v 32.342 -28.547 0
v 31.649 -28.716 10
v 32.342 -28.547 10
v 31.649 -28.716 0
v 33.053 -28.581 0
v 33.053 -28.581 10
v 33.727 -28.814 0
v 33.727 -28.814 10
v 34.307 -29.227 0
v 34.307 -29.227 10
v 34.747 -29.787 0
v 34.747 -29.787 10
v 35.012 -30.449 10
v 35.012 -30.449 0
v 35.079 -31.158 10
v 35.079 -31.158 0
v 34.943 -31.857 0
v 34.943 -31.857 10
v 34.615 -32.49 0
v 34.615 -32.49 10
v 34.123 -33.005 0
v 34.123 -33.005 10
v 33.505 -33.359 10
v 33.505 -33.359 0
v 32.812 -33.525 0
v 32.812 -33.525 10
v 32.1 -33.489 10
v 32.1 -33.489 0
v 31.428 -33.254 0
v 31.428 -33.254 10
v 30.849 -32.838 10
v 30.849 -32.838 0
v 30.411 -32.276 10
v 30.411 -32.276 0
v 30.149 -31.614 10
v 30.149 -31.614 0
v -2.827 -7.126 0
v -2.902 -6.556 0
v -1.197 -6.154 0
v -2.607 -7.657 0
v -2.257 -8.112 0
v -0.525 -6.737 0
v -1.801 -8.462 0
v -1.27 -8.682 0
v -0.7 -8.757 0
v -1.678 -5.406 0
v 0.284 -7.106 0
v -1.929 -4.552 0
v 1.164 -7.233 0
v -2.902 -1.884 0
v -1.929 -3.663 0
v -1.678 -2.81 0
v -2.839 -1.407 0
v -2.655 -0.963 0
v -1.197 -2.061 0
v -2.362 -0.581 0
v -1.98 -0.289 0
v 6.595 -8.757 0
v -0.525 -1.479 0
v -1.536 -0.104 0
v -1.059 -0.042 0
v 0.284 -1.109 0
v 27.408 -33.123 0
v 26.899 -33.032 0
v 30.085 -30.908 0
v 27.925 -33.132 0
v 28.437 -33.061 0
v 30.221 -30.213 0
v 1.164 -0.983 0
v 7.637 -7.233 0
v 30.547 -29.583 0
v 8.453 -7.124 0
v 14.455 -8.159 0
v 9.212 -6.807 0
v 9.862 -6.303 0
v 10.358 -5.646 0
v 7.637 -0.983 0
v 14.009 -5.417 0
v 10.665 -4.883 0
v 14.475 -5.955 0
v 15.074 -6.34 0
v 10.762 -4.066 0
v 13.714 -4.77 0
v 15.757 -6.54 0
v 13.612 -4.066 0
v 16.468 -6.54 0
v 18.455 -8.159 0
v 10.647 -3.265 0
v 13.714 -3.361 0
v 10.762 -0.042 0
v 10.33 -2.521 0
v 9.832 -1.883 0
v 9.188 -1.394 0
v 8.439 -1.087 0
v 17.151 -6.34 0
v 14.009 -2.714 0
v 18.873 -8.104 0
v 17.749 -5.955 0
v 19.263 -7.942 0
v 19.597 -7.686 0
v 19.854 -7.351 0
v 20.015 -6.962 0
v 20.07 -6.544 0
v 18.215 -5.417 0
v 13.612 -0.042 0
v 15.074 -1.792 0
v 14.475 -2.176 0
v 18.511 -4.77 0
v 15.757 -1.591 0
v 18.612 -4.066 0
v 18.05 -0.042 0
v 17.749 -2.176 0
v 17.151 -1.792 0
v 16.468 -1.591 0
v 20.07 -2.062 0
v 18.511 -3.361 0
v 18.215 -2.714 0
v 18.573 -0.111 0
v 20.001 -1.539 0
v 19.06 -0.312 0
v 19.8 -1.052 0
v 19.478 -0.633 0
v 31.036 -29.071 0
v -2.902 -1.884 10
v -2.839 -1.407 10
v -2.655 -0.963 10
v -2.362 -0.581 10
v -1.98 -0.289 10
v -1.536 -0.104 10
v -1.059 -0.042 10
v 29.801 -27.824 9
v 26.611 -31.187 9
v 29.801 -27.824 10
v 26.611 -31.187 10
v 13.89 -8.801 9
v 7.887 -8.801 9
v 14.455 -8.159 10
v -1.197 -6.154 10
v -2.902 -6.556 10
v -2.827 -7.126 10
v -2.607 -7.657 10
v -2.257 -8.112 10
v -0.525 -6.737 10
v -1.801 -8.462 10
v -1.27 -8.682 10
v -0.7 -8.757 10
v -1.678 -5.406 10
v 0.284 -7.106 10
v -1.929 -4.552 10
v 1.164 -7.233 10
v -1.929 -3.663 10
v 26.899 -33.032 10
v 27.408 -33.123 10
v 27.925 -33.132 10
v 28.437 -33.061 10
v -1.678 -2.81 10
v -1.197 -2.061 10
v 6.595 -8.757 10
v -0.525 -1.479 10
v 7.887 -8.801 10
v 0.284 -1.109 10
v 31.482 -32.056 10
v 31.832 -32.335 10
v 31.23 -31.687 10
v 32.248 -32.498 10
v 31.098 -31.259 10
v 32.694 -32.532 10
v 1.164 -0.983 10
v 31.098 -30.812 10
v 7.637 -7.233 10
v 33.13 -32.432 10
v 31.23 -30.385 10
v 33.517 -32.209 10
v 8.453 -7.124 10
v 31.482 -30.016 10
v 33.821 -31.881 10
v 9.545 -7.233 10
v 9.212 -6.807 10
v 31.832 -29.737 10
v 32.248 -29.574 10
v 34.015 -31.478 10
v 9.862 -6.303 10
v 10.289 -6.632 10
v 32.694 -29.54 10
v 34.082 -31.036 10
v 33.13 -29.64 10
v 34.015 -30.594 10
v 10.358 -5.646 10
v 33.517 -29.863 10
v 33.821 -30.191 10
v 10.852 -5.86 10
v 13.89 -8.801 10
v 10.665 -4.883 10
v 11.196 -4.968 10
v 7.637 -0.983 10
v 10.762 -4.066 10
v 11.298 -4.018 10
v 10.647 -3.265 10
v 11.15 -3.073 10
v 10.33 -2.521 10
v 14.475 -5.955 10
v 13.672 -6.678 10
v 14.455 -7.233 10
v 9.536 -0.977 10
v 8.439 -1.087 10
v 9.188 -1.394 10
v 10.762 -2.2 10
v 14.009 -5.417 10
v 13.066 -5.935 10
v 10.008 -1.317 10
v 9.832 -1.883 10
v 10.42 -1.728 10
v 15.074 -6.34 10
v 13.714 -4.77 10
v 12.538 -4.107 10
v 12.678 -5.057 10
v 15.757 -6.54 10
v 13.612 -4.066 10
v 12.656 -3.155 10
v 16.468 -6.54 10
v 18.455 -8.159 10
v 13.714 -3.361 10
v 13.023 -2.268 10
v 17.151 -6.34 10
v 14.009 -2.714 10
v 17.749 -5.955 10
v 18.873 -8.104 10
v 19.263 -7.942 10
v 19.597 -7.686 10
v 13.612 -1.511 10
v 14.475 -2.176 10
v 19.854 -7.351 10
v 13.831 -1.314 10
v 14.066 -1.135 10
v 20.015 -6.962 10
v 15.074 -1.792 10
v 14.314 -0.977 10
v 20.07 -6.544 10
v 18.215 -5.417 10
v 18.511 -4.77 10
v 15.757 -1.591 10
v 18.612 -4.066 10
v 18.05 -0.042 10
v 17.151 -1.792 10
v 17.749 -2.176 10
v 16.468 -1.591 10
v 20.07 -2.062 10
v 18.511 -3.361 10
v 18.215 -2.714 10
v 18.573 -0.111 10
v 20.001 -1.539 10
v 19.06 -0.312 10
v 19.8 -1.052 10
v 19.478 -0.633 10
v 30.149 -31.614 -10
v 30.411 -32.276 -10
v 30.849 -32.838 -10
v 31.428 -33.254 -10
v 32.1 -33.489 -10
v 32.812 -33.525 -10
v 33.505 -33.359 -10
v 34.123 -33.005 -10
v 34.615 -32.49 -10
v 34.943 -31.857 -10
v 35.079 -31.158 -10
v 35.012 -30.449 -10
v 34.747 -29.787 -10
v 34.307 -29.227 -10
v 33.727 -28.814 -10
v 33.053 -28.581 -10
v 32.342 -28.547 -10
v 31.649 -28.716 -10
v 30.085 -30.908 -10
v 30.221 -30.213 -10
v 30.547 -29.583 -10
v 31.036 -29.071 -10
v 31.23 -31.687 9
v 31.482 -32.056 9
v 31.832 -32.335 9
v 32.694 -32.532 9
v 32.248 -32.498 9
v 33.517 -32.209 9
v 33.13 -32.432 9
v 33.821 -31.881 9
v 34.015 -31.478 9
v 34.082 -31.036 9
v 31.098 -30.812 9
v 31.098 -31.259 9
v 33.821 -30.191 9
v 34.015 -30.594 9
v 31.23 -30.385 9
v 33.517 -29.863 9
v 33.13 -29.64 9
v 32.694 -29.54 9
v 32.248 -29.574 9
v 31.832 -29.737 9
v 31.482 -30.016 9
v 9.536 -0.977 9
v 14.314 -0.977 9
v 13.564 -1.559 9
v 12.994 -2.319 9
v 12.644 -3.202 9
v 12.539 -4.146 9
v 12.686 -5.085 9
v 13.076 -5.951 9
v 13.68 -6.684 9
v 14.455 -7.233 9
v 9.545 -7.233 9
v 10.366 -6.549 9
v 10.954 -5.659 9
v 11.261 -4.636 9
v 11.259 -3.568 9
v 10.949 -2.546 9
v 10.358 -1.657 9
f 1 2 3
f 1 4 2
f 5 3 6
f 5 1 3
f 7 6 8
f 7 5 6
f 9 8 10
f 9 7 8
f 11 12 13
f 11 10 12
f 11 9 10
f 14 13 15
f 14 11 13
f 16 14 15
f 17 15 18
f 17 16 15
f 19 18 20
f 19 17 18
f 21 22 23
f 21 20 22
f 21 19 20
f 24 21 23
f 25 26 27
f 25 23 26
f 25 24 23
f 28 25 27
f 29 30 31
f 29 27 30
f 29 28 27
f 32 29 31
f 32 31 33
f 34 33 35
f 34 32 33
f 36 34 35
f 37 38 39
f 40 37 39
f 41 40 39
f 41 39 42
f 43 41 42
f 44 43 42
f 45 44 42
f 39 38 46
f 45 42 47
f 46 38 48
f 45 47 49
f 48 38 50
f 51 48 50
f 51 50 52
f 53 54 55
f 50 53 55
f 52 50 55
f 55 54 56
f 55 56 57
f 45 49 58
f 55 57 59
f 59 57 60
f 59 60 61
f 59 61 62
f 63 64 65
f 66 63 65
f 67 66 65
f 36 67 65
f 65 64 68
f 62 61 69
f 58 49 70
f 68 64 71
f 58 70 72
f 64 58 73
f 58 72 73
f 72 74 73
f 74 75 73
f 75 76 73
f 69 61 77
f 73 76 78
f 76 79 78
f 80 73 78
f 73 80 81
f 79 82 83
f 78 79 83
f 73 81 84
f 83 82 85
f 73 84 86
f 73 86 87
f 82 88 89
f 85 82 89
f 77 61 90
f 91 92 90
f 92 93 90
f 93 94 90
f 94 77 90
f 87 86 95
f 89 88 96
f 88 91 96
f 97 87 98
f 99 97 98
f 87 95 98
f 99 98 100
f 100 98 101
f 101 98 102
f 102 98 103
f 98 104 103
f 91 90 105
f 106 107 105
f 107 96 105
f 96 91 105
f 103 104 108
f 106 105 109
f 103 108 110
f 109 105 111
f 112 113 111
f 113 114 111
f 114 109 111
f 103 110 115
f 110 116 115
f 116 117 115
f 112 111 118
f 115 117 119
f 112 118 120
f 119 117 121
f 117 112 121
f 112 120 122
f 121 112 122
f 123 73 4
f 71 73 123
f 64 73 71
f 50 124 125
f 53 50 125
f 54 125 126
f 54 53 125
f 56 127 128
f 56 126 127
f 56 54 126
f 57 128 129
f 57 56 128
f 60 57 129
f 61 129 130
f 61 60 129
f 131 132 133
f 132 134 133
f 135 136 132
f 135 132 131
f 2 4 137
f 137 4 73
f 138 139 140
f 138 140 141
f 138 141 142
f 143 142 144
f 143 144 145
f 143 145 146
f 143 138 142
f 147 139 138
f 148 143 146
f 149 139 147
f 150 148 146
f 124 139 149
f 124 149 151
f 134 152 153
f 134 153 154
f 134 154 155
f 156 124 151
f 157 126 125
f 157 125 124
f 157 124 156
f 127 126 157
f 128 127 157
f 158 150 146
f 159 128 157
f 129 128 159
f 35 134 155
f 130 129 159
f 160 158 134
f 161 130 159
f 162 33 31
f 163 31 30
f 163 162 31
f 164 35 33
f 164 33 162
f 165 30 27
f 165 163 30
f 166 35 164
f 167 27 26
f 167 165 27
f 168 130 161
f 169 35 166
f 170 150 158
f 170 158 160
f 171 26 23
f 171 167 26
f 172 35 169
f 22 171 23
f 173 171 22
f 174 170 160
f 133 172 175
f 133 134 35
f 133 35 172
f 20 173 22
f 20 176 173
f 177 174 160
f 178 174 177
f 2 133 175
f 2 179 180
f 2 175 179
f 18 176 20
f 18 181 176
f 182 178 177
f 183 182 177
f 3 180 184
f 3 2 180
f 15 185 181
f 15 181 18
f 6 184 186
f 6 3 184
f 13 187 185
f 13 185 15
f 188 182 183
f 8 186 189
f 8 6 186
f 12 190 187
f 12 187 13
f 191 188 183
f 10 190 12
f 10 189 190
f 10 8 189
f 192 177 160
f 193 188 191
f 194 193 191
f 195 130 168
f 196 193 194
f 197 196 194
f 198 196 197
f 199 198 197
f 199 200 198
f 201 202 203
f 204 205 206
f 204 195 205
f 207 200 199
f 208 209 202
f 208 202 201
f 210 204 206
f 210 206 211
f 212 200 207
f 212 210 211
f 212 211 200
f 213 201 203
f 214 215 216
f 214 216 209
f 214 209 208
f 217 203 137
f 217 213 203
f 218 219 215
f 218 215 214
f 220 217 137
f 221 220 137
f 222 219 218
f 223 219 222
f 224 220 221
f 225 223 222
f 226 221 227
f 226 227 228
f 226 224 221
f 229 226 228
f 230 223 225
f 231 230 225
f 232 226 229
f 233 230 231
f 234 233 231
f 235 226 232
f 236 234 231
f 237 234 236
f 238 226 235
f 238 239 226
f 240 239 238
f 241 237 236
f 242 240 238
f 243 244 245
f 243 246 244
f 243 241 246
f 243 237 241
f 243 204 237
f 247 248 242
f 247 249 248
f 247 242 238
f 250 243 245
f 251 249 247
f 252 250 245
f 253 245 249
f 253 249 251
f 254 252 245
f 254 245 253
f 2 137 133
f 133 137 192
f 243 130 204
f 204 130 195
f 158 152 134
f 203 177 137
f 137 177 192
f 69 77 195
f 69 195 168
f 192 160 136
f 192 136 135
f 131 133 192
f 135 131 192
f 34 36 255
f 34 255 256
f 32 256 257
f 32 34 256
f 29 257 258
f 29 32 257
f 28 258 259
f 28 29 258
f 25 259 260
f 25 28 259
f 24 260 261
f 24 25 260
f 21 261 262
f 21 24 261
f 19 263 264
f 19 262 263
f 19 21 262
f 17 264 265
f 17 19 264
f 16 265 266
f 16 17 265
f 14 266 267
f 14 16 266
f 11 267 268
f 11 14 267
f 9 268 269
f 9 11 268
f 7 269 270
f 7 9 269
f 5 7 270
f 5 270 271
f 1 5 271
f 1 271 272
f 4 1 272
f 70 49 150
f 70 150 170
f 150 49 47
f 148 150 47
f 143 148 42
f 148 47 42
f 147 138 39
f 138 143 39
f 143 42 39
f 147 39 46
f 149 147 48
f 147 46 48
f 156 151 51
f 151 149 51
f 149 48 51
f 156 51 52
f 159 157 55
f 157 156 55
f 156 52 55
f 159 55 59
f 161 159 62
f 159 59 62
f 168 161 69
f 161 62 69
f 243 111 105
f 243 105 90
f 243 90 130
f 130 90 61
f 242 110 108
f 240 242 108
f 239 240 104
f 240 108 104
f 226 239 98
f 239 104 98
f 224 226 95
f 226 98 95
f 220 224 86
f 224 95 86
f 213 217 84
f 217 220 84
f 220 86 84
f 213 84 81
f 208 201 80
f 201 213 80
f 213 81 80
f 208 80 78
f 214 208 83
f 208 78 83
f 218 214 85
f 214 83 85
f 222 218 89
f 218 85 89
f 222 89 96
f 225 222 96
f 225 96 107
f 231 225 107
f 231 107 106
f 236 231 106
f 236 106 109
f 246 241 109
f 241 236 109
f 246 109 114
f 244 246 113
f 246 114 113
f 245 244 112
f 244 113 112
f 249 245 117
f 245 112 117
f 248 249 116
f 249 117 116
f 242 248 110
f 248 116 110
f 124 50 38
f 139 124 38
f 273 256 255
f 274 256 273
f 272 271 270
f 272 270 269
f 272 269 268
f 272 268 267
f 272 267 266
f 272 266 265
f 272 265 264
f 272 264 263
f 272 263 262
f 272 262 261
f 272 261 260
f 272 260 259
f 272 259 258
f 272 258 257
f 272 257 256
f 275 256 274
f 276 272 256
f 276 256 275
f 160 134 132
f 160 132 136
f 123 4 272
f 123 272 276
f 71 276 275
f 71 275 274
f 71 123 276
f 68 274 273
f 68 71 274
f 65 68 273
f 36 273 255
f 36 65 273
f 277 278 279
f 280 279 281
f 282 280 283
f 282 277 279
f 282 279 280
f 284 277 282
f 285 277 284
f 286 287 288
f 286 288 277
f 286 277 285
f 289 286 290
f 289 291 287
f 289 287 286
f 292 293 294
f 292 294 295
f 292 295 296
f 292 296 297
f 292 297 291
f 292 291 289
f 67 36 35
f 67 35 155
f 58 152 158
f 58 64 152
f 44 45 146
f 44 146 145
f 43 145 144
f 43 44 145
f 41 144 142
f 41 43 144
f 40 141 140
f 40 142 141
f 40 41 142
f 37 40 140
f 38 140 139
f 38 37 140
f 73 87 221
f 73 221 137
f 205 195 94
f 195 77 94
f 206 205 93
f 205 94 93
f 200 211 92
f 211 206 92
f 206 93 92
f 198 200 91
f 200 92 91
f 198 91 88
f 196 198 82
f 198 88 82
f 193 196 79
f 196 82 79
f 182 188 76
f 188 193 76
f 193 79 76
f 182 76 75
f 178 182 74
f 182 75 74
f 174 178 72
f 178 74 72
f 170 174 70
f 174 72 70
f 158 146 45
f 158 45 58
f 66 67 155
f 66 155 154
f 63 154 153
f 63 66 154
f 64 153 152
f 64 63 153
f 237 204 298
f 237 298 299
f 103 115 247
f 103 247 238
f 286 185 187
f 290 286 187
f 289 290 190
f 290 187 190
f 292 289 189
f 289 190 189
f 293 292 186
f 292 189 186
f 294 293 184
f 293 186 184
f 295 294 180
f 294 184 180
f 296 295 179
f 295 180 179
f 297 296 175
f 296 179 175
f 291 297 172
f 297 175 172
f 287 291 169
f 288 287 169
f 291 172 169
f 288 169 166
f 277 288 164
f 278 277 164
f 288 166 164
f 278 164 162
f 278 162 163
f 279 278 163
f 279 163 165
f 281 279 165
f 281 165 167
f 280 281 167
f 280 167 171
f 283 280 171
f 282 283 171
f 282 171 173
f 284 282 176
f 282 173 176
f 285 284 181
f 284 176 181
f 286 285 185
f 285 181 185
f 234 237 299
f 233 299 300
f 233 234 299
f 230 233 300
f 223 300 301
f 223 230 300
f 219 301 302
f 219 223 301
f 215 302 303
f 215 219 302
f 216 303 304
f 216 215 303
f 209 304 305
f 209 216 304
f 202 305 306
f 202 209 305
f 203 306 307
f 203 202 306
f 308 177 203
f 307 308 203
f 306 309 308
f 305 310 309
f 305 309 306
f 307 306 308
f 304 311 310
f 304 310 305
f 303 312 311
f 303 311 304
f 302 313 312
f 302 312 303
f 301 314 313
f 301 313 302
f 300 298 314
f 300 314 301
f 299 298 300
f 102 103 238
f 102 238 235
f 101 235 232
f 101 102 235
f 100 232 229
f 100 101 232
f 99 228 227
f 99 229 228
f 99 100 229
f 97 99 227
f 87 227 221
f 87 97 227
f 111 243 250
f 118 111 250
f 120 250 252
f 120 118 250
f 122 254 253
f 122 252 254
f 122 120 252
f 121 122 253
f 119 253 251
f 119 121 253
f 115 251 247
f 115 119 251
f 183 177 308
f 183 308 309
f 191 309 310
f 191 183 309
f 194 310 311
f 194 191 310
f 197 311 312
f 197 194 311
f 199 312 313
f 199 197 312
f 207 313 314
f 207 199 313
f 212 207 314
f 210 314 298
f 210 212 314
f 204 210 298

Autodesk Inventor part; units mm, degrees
ref_plane "YZ Plane" through (0, 0, 0) normal (1, 0, 0) x (0, 1, 0)
ref_plane "XZ Plane" through (0, 0, 0) normal (0, 1, 0) x (-1, 0, 0)
ref_plane "XY Plane" through (0, 0, 0) normal (0, 0, 1) x (1, 0, 0)
sketch "スケッチ1" plane through (0, 0, 0) normal (0, 0, 1) x (1, 0, 0)
  line L0 (18.4549, -8.1589) -> (14.4552, -8.1589)
  arc A0 (18.4549, -8.1589) -> (20.0703, -6.5435) centre (18.4549, -6.5435) ccw
  line L1 (20.0703, -2.0624) -> (20.0703, -6.5435)
  line L2 (18.0495, -0.0417) -> (-1.0589, -0.0417)
  arc A1 (-1.0589, -0.0417) -> (-2.9016, -1.8843) centre (-1.0589, -1.8843) ccw
  line L3 (-2.9016, -1.8843) -> (-2.9016, -6.5559)
  arc A2 (-2.9016, -6.5559) -> (-0.7003, -8.7571) centre (-0.7003, -6.5559) ccw
  arc A3 (26.8987, -33.0319) -> (28.4367, -33.0608) centre (27.7277, -29.8571) ccw
  line L4 (30.1493, -31.6136) -> (28.4367, -33.0608)
  arc A4 (30.1493, -31.6136) -> (31.6494, -28.7162) centre (32.5816, -31.0359) ccw
  line L5 (31.6494, -28.7162) -> (14.4552, -8.1589)
  circle A5 centre (16.1123, -4.0657) radius 2.5
  line L6 (7.6373, -0.9827) -> (1.1644, -0.9827)
  arc A6 (7.6373, -7.2327) -> (7.6373, -0.9827) centre (7.6373, -4.1077) ccw
  arc A7 (1.1644, -0.9827) -> (1.1644, -7.2327) centre (1.1644, -4.1077) ccw
  line L7 (26.8987, -33.0319) -> (6.5951, -8.7571)
  line L8 (-0.7003, -8.7571) -> (6.5951, -8.7571)
  arc A8 (20.0703, -2.0624) -> (18.0495, -0.0417) centre (18.0495, -2.0624) ccw
  line L9 (1.1644, -7.2327) -> (7.6373, -7.2327)
  line L10 (13.6123, -4.0657) -> (13.6123, 1.3375)
  line L11 (10.7623, -4.0657) -> (10.7623, 0.9924)
  point P0 (0, 0)
  point P1 (0, 0)
  dimension "d0" = 5
  dimension "d1" = 3.125
  dimension "d2" = 4.8539
  dimension "d3" = 4.066
  dimension "d4" = 4.066
  dimension "d5" = 90
  dimension "d6" = 90
  dimension "d7" = 3.125
  dimension "d8" = 3.9579
  dimension "d9" = 22.9718
  dimension "d10" = 2.5
  dimension "d11" = 2.85
extrude "押し出し1" add sketch "スケッチ1" along normal blind 10
sketch "スケッチ2" plane through (0, 0, 0) normal (0, 0, -1) x (-1, 0, 0)
  arc A0 (-7.6373, -0.9827) -> (-7.6373, -7.2327) centre (-7.6373, -4.1077) ccw projected
  line L0 (-7.6373, -0.9827) -> (-1.1644, -0.9827) projected
  arc A1 (-1.1644, -7.2327) -> (-1.1644, -0.9827) centre (-1.1644, -4.1077) ccw projected
  line L1 (-1.1644, -7.2327) -> (-7.6373, -7.2327) projected
  circle A2 centre (-16.1123, -4.0657) radius 2.5 projected
  line L2 (-14.4552, -8.1589) -> (-18.4549, -8.1589) projected
  line L3 (-31.6494, -28.7162) -> (-14.4552, -8.1589) projected
  arc A3 (-31.6494, -28.7162) -> (-30.1493, -31.6136) centre (-32.5816, -31.0359) ccw projected
  line L4 (-28.4367, -33.0608) -> (-30.1493, -31.6136) projected
  arc A4 (-28.4367, -33.0608) -> (-26.8987, -33.0319) centre (-27.7277, -29.8571) ccw projected
  line L5 (-6.5951, -8.7571) -> (-26.8987, -33.0319) projected
  line L6 (0.7003, -8.7571) -> (-6.5951, -8.7571) projected
  arc A5 (0.7003, -8.7571) -> (2.9016, -6.5559) centre (0.7003, -6.5559) ccw projected
  line L7 (2.9016, -1.8843) -> (2.9016, -6.5559) projected
  arc A6 (2.9016, -1.8843) -> (1.0589, -0.0417) centre (1.0589, -1.8843) ccw projected
  line L8 (-18.0495, -0.0417) -> (1.0589, -0.0417) projected
  arc A7 (-18.0495, -0.0417) -> (-20.0703, -2.0624) centre (-18.0495, -2.0624) ccw projected
  line L9 (-20.0703, -6.5435) -> (-20.0703, -2.0624) projected
  arc A8 (-20.0703, -6.5435) -> (-18.4549, -8.1589) centre (-18.4549, -6.5435) ccw projected
  circle A9 centre (-32.5816, -31.0359) radius 2.5
  point P0 (0, 0)
extrude "押し出し2" add sketch "スケッチ2" along normal blind 10 contours A9 A3
sketch "スケッチ3" plane through (0, 0, 10) normal (0, 0, 1) x (1, 0, 0)
  arc A0 (7.6373, -7.2327) -> (7.6373, -0.9827) centre (7.6373, -4.1077) ccw
  circle A1 centre (16.1123, -4.0657) radius 2.5
  line L0 (18.0495, -0.0417) -> (-1.0589, -0.0417)
  line L1 (14.2688, -7.695) -> (18.4549, -7.695)
  line L2 (7.8873, -8.8011) -> (13.8903, -8.8011)
  line L3 (13.8903, -8.8011) -> (29.8014, -27.8243)
  line L4 (29.8014, -27.8243) -> (26.6112, -31.1873)
  line L5 (26.6112, -31.1873) -> (7.8873, -8.8011)
  line L6 (7.8873, -8.8011) -> (13.8903, -8.8011)
  arc A2 (7.6373, -7.2327) -> (7.6373, -0.9827) centre (7.6373, -4.1077) ccw
  line L7 (7.6373, -7.2327) -> (1.1644, -7.2327)
  arc A3 (1.1644, -0.9827) -> (1.1644, -7.2327) centre (1.1644, -4.1077) ccw
  line L8 (1.1644, -0.9827) -> (7.6373, -0.9827)
  circle A4 centre (16.1123, -4.0657) radius 2.5
  line L9 (14.2688, -7.695) -> (18.4549, -7.695)
  arc A5 (18.4549, -7.695) -> (20.0703, -6.0796) centre (18.4549, -6.0796) ccw
  line L10 (20.0703, -6.0796) -> (20.0703, -2.0624)
  arc A6 (20.0703, -2.0624) -> (18.0495, -0.0417) centre (18.0495, -2.0624) ccw
  line L11 (18.0495, -0.0417) -> (-1.0589, -0.0417)
  arc A7 (-1.0589, -0.0417) -> (-2.9016, -1.8843) centre (-1.0589, -1.8843) ccw
  line L12 (-2.9016, -1.8843) -> (-2.9016, -6.5999)
  arc A8 (-2.9016, -6.5999) -> (-0.7003, -8.8011) centre (-0.7003, -6.5999) ccw
  line L13 (-0.7003, -8.8011) -> (6.5837, -8.8011)
  line L14 (6.5837, -8.8011) -> (26.8872, -33.0759)
  arc A9 (26.8872, -33.0759) -> (27.9503, -33.1763) centre (27.7277, -29.8571) ccw
  line L15 (27.9503, -33.1763) -> (29.6628, -31.7291)
  arc A10 (29.6628, -31.7291) -> (31.463, -28.2522) centre (32.5816, -31.0359) ccw
  line L16 (31.463, -28.2522) -> (14.2688, -7.695)
  arc A11 (9.5454, -7.2327) -> (9.5355, -0.9767) centre (7.6373, -4.1077) ccw
  arc A12 (14.3143, -0.9767) -> (14.4552, -7.2327) centre (16.1123, -4.0657) ccw
  line L17 (9.5454, -7.2327) -> (14.4552, -7.2327)
  line L18 (9.5355, -0.9767) -> (14.3143, -0.9767)
  point P0 (0, 0)
  point P1 (0, 0)
extrude "押し出し3" cut sketch "スケッチ3" against normal blind 1 contours A11 L18 A12 L17
sketch "スケッチ4" plane through (0, 0, 10) normal (0, 0, 1) x (1, 0, 0)
  line L0 (6.5837, -8.8011) -> (26.8872, -33.0759)
  line L1 (31.463, -28.2522) -> (14.2688, -7.695)
  line L2 (6.5837, -8.8011) -> (15.194, -8.8011)
  line L3 (26.8872, -33.0759) -> (31.463, -28.2522)
  line L4 (31.463, -28.2522) -> (15.194, -8.8011)
  line L5 (26.8872, -33.0759) -> (6.5837, -8.8011)
  line L6 (25.9184, -31.9176) -> (30.4942, -27.0939)
  line L7 (26.6112, -31.1873) -> (7.8873, -8.8011)
  line L8 (29.8014, -27.8243) -> (13.8903, -8.8011)
  point P0 (0, 0)
  point P1 (0, 0)
  dimension "d18" = 1.5
  dimension "d19" = 1
  dimension "d20" = 1
extrude "押し出し4" cut sketch "スケッチ4" against normal blind 1 contours L2 L8 L6 L7
sketch "スケッチ5" plane through (0, 0, 10) normal (0, 0, 1) x (1, 0, 0)
  arc A0 (30.1493, -31.6136) -> (31.6494, -28.7162) centre (32.5816, -31.0359) ccw projected
  circle A1 centre (32.5816, -31.0359) radius 1.5
  point P0 (0, 0)
  point P1 (0, 0)
  dimension "d26" = 1
extrude "押し出し5" cut sketch "スケッチ5" against normal blind 1
equation "\"d4\" = d3"
equation "\"d7\" = d1"
properties part number "finger_4_5mm"
